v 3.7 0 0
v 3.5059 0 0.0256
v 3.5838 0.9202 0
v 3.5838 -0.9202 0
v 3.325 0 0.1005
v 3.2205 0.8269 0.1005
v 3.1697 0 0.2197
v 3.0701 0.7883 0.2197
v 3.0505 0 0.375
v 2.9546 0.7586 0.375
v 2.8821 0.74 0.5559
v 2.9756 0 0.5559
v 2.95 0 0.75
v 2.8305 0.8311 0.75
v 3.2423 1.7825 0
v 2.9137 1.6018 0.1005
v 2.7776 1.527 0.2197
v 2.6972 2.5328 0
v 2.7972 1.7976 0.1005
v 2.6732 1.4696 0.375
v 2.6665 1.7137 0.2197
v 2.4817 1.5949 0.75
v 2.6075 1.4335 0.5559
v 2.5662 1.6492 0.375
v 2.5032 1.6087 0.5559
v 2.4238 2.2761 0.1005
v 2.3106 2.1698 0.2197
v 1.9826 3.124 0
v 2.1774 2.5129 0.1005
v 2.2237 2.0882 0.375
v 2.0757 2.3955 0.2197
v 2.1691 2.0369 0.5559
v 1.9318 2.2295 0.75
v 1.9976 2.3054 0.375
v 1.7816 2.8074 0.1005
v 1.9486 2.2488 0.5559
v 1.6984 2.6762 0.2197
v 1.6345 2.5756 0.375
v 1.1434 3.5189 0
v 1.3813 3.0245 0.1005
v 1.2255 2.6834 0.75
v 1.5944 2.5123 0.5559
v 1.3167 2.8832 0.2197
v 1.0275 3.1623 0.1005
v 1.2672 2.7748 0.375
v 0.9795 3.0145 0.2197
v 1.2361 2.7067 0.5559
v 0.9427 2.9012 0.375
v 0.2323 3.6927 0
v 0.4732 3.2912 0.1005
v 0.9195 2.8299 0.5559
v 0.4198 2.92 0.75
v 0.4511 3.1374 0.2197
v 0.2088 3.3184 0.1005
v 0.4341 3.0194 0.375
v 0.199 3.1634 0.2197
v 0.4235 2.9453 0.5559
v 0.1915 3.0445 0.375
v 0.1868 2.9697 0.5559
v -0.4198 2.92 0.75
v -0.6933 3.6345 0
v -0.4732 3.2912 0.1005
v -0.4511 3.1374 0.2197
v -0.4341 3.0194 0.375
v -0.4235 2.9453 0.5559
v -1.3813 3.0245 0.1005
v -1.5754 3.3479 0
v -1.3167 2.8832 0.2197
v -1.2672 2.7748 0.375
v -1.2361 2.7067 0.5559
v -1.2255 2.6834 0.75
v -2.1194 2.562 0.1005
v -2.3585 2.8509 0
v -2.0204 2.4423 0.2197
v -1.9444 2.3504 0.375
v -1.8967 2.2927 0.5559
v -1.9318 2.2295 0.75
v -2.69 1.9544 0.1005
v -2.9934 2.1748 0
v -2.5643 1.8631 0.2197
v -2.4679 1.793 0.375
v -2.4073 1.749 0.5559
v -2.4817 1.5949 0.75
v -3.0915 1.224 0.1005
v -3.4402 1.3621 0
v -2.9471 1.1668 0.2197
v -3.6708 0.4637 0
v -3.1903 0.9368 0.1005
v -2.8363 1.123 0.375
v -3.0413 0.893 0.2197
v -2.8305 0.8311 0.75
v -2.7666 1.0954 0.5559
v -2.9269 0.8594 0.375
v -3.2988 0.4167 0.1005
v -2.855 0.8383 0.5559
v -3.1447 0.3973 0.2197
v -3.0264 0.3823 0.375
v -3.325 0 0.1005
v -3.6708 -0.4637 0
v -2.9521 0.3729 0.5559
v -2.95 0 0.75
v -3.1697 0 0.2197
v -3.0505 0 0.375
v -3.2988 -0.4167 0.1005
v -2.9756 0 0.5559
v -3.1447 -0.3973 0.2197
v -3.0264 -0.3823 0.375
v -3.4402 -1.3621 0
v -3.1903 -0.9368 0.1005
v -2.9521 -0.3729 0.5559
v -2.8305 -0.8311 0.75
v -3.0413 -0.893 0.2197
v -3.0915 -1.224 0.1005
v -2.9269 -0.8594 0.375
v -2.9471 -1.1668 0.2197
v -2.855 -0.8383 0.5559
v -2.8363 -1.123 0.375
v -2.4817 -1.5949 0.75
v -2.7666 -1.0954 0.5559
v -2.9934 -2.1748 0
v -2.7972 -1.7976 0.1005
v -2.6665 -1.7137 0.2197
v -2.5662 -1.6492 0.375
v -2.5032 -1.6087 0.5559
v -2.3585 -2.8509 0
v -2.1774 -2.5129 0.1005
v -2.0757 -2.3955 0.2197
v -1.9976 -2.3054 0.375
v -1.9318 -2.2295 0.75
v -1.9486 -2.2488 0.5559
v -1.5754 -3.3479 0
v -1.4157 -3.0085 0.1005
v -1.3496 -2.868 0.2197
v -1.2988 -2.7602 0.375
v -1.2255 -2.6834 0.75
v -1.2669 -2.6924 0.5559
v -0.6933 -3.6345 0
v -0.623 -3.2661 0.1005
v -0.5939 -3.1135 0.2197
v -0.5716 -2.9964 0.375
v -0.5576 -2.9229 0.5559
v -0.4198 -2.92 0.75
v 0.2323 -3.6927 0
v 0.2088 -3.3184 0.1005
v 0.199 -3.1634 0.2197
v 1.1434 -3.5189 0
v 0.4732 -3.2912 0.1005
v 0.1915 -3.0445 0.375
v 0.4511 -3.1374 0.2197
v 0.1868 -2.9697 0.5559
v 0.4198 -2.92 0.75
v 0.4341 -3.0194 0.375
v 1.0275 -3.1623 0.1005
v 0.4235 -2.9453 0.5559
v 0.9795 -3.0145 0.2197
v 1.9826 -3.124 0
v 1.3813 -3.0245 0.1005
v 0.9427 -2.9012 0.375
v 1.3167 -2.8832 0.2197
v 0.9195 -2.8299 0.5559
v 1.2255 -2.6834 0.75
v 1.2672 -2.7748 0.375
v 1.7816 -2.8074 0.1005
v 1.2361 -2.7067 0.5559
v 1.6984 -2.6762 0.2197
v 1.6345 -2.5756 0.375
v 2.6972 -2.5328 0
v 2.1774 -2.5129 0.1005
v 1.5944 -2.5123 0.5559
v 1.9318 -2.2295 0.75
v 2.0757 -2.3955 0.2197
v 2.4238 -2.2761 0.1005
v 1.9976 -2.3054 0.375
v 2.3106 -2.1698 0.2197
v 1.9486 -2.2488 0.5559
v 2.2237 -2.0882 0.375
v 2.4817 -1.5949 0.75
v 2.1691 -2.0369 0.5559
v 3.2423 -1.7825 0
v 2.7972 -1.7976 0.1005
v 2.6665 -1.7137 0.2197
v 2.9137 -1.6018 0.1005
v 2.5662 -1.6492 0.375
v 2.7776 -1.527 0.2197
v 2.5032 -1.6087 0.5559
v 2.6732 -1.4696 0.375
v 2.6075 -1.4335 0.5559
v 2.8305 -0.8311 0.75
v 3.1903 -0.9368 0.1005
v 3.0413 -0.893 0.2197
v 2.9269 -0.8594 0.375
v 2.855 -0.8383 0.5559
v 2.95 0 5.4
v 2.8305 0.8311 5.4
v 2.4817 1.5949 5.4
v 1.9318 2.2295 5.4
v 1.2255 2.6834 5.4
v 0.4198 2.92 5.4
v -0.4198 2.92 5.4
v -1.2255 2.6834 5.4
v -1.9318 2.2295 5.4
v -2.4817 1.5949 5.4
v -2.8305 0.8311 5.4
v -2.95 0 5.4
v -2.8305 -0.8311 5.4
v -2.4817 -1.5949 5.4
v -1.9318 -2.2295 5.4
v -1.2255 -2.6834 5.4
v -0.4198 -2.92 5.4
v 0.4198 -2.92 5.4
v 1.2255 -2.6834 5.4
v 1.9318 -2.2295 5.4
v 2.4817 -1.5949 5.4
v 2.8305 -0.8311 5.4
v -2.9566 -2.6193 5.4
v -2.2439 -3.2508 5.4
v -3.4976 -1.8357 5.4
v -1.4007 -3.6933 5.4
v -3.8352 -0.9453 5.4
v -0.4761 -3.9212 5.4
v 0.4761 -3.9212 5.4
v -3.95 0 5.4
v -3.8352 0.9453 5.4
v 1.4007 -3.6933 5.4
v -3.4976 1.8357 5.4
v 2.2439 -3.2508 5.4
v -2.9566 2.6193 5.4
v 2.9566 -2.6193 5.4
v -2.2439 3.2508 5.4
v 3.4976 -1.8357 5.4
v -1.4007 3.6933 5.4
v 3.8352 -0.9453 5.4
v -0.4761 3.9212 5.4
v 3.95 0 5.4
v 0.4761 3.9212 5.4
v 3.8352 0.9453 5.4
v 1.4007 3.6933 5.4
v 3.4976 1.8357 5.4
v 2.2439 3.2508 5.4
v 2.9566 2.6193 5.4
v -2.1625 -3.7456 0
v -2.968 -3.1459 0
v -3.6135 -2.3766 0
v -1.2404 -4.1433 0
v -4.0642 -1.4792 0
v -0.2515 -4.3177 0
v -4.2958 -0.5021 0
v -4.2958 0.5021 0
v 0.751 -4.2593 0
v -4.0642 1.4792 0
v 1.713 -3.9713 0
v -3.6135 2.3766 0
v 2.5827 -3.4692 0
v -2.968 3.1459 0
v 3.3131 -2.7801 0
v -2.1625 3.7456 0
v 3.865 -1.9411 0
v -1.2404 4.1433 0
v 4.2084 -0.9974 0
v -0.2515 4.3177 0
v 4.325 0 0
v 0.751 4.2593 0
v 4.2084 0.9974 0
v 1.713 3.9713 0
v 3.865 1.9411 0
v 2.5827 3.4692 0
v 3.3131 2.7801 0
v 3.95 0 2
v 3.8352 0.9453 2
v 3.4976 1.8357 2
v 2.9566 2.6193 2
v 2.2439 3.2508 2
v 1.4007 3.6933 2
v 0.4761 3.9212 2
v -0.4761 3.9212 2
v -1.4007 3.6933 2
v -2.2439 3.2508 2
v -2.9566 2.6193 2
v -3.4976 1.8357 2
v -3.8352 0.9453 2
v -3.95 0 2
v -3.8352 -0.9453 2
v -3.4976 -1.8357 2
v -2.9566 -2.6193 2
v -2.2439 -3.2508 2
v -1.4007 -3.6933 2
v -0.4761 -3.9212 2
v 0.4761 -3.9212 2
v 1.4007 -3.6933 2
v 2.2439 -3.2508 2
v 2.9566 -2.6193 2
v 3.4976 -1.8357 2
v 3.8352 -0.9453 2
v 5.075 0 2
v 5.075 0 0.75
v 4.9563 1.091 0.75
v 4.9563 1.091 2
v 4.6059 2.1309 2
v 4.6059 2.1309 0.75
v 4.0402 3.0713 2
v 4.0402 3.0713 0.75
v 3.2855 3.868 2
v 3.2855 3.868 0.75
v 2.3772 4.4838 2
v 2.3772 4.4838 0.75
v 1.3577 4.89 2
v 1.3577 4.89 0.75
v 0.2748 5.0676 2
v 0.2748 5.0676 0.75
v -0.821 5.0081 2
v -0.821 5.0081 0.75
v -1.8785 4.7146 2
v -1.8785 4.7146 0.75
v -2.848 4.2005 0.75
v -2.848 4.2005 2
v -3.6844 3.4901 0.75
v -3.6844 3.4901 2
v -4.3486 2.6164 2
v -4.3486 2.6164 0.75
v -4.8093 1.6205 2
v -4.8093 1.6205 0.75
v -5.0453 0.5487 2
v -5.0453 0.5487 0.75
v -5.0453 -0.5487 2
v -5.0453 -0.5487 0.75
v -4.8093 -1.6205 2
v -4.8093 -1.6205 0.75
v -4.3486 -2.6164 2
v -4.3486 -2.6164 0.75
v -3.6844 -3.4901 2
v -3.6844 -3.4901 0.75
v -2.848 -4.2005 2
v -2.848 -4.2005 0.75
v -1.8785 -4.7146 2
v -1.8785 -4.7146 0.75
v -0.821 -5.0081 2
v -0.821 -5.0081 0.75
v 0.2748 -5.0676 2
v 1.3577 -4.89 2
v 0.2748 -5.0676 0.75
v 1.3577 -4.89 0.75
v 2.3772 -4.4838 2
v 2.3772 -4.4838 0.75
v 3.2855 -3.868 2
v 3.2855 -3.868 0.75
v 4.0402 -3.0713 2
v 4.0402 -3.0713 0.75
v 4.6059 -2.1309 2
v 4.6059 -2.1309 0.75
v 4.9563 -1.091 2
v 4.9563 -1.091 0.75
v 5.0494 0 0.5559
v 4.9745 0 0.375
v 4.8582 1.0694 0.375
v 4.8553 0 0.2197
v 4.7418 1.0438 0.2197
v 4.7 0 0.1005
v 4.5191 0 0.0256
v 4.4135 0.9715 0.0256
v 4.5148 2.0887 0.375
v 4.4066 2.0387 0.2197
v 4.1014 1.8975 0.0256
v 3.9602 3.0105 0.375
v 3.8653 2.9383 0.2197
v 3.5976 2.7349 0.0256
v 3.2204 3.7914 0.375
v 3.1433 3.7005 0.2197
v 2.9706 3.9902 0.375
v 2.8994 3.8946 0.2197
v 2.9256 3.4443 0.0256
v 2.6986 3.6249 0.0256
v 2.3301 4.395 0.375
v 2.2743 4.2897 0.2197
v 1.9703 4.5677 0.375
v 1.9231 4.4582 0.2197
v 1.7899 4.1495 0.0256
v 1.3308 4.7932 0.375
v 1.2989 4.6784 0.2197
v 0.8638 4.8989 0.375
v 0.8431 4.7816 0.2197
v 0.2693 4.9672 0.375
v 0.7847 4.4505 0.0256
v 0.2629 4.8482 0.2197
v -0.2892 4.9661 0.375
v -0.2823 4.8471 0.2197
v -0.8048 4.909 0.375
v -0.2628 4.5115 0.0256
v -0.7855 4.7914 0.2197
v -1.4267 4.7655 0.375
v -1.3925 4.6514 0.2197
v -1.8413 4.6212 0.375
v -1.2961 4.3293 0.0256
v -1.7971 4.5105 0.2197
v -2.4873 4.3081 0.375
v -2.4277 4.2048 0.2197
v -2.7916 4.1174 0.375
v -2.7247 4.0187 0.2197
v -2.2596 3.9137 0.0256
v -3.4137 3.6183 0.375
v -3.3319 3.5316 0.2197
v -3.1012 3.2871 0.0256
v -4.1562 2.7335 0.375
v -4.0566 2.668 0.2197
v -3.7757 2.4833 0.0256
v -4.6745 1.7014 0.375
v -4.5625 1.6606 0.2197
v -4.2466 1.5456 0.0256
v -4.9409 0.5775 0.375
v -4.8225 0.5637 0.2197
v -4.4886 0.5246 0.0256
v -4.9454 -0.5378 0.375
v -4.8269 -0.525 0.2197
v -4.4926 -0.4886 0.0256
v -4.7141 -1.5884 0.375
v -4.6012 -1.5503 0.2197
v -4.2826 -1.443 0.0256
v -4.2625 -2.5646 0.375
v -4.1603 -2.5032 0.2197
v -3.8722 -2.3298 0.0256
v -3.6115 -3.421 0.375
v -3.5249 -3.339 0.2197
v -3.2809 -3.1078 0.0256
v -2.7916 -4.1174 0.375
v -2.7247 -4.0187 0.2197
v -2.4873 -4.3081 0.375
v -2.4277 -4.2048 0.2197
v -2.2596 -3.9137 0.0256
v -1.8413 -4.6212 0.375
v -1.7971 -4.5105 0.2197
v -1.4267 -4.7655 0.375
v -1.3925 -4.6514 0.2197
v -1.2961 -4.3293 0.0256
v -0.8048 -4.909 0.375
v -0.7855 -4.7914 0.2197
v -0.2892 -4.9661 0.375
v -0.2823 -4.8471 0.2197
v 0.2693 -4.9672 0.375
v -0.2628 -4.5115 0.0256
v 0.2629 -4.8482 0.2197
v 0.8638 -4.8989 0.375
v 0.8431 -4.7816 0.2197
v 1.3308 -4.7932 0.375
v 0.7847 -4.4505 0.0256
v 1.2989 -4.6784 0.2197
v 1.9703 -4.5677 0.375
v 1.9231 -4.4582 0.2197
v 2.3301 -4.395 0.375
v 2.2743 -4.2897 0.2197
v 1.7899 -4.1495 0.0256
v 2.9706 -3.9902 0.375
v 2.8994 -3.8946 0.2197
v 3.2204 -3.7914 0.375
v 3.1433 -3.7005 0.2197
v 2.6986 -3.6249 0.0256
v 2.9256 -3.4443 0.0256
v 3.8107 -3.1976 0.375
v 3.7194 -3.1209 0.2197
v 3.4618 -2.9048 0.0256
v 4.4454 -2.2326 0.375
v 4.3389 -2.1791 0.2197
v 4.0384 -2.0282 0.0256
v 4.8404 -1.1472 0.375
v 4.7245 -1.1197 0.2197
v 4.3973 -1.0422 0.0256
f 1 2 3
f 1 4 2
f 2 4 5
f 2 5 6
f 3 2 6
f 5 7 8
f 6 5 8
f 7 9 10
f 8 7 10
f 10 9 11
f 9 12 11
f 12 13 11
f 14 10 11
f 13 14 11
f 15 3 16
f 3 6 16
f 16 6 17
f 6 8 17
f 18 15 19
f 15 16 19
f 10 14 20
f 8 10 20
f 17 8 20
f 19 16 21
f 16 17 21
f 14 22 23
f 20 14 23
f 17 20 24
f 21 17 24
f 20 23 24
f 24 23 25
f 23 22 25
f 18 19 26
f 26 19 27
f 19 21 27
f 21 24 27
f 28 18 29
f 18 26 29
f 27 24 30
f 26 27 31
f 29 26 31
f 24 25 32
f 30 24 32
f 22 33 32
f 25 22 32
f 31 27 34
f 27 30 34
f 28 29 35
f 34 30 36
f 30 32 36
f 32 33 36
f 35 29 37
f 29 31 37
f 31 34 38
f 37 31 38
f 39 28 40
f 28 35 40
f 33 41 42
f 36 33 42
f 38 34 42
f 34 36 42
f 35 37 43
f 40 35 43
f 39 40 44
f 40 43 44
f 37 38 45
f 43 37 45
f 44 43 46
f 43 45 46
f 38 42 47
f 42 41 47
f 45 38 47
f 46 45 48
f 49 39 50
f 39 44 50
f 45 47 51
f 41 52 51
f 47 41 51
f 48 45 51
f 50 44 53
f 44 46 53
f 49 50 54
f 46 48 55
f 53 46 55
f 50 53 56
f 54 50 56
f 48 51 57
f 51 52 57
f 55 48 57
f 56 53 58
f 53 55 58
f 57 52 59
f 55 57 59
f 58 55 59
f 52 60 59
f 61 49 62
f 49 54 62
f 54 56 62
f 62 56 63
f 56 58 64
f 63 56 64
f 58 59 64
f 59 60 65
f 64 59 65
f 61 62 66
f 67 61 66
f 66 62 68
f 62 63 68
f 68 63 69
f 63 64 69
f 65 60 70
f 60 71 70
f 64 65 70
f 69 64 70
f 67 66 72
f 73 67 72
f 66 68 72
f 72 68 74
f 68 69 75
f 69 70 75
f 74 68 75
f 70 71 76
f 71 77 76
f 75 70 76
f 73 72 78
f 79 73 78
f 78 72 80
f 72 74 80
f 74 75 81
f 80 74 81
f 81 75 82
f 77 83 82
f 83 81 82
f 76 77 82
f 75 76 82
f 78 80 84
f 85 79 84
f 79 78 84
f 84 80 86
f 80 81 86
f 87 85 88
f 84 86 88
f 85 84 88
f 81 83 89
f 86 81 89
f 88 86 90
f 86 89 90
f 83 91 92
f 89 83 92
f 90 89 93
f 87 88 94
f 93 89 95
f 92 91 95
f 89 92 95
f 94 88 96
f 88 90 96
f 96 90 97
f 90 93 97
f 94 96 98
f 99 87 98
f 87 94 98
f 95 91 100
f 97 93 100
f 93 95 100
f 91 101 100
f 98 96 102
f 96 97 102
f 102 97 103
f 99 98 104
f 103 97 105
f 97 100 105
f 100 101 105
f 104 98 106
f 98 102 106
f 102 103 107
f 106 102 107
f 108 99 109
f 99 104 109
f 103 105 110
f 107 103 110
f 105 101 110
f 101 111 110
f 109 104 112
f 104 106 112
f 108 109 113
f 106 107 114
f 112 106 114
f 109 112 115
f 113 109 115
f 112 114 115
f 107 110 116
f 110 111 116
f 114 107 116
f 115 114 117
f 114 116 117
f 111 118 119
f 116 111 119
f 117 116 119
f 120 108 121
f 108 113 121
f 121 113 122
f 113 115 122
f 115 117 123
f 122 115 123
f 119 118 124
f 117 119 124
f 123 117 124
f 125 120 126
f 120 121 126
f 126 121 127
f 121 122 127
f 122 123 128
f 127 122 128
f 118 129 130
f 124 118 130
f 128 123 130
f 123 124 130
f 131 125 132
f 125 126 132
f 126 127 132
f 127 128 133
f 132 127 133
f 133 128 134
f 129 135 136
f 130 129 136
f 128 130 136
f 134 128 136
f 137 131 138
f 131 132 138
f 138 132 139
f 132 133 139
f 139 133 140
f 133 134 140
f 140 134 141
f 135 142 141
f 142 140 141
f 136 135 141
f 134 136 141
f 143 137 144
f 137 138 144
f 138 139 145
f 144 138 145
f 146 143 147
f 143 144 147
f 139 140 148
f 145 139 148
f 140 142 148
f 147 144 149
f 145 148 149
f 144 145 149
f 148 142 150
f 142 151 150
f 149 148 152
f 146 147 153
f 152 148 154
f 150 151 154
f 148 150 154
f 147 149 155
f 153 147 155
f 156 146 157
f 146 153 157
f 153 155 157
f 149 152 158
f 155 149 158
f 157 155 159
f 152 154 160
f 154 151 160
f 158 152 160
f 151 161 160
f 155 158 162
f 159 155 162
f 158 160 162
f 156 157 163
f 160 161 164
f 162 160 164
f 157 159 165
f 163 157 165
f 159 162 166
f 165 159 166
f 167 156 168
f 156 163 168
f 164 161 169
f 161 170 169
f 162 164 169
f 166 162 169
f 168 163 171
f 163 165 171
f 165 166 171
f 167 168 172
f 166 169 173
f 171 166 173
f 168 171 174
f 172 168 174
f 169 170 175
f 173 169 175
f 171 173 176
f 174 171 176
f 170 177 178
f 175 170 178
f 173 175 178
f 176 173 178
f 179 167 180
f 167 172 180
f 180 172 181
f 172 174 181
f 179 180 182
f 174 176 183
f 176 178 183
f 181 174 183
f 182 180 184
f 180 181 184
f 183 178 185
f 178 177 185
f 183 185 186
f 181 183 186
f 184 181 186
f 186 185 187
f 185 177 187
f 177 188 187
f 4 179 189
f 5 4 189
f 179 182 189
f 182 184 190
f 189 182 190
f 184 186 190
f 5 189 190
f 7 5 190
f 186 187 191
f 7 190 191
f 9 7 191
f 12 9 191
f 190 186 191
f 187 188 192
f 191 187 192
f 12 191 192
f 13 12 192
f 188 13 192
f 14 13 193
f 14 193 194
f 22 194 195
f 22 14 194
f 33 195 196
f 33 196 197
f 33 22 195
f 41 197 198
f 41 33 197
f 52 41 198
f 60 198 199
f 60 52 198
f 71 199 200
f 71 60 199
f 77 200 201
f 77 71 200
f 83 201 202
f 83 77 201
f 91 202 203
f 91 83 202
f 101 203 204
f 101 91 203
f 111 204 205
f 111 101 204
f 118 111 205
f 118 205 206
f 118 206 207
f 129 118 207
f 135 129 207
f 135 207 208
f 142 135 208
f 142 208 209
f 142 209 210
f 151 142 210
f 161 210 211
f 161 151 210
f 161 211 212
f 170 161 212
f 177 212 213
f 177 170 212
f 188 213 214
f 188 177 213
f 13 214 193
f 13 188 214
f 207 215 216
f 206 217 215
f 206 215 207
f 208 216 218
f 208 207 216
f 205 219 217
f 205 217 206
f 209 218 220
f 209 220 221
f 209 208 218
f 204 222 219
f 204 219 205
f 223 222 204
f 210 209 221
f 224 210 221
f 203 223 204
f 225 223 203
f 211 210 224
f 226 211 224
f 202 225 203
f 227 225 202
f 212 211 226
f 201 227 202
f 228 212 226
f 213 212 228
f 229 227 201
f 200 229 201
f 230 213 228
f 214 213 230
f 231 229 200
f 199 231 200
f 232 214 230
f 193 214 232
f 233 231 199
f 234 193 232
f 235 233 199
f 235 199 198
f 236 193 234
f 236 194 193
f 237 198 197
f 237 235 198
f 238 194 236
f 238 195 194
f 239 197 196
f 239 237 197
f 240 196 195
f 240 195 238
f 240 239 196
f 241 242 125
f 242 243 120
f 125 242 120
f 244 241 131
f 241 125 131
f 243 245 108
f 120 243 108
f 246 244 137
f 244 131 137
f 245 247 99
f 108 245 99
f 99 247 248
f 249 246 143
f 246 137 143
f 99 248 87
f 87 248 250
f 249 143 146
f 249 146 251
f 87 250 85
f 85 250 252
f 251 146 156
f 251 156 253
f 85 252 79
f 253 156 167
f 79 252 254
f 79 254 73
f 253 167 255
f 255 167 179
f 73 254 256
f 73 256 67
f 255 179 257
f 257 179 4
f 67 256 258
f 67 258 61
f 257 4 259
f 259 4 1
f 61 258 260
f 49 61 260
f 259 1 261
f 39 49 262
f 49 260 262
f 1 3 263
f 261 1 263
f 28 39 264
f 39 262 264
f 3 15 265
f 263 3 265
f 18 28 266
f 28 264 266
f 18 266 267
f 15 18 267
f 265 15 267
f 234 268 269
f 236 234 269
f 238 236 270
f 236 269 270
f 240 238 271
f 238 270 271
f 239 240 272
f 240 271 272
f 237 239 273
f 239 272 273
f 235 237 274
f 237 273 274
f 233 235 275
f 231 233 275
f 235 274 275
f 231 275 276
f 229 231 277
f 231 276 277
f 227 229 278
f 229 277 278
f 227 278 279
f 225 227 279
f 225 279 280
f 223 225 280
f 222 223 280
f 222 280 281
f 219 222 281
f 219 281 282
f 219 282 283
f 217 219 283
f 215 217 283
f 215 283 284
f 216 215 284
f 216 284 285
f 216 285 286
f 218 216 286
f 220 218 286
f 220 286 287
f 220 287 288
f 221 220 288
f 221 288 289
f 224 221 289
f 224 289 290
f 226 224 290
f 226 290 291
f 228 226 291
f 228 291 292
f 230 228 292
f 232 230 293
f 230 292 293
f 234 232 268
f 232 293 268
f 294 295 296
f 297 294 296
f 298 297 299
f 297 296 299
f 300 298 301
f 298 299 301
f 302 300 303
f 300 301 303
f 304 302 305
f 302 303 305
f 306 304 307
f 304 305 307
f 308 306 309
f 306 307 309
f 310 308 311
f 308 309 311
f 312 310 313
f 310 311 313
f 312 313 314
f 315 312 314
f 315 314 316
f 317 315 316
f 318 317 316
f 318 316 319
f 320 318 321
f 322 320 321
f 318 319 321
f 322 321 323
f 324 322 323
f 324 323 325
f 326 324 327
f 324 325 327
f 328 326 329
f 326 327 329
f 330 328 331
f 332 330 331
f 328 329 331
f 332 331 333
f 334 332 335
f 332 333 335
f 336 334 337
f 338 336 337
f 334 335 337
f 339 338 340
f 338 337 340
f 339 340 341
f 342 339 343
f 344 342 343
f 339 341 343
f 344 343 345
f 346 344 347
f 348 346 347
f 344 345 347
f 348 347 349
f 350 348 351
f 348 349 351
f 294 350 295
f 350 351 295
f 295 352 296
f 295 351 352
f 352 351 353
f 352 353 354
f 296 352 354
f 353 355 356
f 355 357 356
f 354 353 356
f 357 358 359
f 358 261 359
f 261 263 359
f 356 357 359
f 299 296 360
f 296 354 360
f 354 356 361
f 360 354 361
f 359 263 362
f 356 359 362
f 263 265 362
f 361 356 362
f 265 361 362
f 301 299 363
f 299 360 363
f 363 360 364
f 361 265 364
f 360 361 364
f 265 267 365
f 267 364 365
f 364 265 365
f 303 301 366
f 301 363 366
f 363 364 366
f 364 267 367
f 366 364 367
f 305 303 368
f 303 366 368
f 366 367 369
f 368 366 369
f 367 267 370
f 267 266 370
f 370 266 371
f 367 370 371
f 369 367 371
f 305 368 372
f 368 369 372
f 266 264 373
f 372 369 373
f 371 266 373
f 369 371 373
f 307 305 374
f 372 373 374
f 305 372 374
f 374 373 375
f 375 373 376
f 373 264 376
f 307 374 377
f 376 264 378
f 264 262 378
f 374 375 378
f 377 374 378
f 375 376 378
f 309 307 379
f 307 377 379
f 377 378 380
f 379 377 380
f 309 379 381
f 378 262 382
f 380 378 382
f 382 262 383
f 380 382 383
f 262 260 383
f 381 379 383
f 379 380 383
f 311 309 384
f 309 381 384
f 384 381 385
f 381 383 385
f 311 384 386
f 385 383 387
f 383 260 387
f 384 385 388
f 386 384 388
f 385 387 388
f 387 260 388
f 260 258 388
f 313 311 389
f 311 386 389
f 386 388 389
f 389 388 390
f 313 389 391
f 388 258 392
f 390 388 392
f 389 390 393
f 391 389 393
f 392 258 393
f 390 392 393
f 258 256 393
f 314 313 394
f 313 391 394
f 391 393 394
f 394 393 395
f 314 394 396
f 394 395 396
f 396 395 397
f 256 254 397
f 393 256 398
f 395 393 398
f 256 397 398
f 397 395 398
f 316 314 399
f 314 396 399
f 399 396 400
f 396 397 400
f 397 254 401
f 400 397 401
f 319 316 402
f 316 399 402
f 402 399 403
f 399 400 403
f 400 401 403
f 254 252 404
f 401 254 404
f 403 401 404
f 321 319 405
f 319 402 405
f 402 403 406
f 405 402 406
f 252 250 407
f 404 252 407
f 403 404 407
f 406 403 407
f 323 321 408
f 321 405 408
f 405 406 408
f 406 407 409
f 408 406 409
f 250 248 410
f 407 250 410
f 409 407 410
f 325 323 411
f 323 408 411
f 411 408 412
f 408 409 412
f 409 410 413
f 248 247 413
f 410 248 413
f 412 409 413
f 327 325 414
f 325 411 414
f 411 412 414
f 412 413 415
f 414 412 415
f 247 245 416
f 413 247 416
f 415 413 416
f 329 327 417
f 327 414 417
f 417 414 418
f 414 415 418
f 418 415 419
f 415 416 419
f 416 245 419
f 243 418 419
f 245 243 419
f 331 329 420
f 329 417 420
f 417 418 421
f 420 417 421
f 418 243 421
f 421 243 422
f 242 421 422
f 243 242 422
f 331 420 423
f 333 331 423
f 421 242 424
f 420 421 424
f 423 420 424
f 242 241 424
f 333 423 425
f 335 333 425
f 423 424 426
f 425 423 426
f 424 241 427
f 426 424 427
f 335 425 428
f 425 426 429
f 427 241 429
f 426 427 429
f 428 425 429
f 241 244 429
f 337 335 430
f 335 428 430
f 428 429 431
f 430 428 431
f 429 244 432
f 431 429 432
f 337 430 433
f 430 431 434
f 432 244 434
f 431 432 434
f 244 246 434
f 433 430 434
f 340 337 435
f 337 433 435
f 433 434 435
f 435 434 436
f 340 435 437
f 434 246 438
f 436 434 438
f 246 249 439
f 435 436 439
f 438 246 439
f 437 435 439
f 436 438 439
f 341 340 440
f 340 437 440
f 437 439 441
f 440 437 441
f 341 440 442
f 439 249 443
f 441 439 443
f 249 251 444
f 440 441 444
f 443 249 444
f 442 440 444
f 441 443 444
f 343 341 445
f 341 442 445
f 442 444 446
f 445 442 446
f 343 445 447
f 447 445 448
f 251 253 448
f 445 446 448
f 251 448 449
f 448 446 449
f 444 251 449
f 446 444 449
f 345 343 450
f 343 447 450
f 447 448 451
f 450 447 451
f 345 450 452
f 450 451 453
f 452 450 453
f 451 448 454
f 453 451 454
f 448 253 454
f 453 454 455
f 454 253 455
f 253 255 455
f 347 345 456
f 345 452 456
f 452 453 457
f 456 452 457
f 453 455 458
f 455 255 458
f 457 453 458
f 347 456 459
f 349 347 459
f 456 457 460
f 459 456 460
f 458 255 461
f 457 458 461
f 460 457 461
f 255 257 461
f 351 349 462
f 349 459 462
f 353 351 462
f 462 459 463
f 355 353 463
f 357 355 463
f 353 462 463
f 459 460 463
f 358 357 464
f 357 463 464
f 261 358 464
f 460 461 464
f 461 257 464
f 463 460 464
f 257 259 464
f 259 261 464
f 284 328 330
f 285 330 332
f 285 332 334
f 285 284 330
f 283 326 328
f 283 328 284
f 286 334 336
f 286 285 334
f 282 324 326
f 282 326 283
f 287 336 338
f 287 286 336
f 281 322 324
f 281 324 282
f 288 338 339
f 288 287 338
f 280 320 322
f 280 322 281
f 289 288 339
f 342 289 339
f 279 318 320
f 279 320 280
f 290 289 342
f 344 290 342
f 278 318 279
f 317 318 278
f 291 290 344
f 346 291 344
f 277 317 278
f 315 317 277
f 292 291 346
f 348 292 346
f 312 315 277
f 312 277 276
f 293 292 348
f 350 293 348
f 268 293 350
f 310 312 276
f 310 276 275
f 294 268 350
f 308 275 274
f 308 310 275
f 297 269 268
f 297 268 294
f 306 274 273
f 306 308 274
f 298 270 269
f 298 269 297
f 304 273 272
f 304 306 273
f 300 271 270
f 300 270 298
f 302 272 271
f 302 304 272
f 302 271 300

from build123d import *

# Parameters (mm, degrees)
F0_R     = 3.95
F0_R_2   = 2.95
F1_DEPTH = 5.4
F0_R_3   = 5.075
F2_DEPTH = 2
F3_R     = 0.75


with BuildPart() as f1:
    # F0 (on Top) → F1 (new body)
    with BuildSketch(Plane.XY):
        Circle(F0_R)
        Circle(F0_R_2, mode=Mode.SUBTRACT)
    extrude(amount=F1_DEPTH)

    # F0 (on Top) → F2 (join)
    with BuildSketch(Plane.XY):
        Circle(F0_R_3)
        Circle(F0_R, mode=Mode.SUBTRACT)
    extrude(amount=F2_DEPTH)

    # F3
    f3_edges = [f1.edges().sort_by_distance(p)[0] for p in [
        (-5.075, 0, 0),
        (-2.95, 0, 0),
    ]]
    fillet(f3_edges, radius=F3_R)


solid = f1.part
